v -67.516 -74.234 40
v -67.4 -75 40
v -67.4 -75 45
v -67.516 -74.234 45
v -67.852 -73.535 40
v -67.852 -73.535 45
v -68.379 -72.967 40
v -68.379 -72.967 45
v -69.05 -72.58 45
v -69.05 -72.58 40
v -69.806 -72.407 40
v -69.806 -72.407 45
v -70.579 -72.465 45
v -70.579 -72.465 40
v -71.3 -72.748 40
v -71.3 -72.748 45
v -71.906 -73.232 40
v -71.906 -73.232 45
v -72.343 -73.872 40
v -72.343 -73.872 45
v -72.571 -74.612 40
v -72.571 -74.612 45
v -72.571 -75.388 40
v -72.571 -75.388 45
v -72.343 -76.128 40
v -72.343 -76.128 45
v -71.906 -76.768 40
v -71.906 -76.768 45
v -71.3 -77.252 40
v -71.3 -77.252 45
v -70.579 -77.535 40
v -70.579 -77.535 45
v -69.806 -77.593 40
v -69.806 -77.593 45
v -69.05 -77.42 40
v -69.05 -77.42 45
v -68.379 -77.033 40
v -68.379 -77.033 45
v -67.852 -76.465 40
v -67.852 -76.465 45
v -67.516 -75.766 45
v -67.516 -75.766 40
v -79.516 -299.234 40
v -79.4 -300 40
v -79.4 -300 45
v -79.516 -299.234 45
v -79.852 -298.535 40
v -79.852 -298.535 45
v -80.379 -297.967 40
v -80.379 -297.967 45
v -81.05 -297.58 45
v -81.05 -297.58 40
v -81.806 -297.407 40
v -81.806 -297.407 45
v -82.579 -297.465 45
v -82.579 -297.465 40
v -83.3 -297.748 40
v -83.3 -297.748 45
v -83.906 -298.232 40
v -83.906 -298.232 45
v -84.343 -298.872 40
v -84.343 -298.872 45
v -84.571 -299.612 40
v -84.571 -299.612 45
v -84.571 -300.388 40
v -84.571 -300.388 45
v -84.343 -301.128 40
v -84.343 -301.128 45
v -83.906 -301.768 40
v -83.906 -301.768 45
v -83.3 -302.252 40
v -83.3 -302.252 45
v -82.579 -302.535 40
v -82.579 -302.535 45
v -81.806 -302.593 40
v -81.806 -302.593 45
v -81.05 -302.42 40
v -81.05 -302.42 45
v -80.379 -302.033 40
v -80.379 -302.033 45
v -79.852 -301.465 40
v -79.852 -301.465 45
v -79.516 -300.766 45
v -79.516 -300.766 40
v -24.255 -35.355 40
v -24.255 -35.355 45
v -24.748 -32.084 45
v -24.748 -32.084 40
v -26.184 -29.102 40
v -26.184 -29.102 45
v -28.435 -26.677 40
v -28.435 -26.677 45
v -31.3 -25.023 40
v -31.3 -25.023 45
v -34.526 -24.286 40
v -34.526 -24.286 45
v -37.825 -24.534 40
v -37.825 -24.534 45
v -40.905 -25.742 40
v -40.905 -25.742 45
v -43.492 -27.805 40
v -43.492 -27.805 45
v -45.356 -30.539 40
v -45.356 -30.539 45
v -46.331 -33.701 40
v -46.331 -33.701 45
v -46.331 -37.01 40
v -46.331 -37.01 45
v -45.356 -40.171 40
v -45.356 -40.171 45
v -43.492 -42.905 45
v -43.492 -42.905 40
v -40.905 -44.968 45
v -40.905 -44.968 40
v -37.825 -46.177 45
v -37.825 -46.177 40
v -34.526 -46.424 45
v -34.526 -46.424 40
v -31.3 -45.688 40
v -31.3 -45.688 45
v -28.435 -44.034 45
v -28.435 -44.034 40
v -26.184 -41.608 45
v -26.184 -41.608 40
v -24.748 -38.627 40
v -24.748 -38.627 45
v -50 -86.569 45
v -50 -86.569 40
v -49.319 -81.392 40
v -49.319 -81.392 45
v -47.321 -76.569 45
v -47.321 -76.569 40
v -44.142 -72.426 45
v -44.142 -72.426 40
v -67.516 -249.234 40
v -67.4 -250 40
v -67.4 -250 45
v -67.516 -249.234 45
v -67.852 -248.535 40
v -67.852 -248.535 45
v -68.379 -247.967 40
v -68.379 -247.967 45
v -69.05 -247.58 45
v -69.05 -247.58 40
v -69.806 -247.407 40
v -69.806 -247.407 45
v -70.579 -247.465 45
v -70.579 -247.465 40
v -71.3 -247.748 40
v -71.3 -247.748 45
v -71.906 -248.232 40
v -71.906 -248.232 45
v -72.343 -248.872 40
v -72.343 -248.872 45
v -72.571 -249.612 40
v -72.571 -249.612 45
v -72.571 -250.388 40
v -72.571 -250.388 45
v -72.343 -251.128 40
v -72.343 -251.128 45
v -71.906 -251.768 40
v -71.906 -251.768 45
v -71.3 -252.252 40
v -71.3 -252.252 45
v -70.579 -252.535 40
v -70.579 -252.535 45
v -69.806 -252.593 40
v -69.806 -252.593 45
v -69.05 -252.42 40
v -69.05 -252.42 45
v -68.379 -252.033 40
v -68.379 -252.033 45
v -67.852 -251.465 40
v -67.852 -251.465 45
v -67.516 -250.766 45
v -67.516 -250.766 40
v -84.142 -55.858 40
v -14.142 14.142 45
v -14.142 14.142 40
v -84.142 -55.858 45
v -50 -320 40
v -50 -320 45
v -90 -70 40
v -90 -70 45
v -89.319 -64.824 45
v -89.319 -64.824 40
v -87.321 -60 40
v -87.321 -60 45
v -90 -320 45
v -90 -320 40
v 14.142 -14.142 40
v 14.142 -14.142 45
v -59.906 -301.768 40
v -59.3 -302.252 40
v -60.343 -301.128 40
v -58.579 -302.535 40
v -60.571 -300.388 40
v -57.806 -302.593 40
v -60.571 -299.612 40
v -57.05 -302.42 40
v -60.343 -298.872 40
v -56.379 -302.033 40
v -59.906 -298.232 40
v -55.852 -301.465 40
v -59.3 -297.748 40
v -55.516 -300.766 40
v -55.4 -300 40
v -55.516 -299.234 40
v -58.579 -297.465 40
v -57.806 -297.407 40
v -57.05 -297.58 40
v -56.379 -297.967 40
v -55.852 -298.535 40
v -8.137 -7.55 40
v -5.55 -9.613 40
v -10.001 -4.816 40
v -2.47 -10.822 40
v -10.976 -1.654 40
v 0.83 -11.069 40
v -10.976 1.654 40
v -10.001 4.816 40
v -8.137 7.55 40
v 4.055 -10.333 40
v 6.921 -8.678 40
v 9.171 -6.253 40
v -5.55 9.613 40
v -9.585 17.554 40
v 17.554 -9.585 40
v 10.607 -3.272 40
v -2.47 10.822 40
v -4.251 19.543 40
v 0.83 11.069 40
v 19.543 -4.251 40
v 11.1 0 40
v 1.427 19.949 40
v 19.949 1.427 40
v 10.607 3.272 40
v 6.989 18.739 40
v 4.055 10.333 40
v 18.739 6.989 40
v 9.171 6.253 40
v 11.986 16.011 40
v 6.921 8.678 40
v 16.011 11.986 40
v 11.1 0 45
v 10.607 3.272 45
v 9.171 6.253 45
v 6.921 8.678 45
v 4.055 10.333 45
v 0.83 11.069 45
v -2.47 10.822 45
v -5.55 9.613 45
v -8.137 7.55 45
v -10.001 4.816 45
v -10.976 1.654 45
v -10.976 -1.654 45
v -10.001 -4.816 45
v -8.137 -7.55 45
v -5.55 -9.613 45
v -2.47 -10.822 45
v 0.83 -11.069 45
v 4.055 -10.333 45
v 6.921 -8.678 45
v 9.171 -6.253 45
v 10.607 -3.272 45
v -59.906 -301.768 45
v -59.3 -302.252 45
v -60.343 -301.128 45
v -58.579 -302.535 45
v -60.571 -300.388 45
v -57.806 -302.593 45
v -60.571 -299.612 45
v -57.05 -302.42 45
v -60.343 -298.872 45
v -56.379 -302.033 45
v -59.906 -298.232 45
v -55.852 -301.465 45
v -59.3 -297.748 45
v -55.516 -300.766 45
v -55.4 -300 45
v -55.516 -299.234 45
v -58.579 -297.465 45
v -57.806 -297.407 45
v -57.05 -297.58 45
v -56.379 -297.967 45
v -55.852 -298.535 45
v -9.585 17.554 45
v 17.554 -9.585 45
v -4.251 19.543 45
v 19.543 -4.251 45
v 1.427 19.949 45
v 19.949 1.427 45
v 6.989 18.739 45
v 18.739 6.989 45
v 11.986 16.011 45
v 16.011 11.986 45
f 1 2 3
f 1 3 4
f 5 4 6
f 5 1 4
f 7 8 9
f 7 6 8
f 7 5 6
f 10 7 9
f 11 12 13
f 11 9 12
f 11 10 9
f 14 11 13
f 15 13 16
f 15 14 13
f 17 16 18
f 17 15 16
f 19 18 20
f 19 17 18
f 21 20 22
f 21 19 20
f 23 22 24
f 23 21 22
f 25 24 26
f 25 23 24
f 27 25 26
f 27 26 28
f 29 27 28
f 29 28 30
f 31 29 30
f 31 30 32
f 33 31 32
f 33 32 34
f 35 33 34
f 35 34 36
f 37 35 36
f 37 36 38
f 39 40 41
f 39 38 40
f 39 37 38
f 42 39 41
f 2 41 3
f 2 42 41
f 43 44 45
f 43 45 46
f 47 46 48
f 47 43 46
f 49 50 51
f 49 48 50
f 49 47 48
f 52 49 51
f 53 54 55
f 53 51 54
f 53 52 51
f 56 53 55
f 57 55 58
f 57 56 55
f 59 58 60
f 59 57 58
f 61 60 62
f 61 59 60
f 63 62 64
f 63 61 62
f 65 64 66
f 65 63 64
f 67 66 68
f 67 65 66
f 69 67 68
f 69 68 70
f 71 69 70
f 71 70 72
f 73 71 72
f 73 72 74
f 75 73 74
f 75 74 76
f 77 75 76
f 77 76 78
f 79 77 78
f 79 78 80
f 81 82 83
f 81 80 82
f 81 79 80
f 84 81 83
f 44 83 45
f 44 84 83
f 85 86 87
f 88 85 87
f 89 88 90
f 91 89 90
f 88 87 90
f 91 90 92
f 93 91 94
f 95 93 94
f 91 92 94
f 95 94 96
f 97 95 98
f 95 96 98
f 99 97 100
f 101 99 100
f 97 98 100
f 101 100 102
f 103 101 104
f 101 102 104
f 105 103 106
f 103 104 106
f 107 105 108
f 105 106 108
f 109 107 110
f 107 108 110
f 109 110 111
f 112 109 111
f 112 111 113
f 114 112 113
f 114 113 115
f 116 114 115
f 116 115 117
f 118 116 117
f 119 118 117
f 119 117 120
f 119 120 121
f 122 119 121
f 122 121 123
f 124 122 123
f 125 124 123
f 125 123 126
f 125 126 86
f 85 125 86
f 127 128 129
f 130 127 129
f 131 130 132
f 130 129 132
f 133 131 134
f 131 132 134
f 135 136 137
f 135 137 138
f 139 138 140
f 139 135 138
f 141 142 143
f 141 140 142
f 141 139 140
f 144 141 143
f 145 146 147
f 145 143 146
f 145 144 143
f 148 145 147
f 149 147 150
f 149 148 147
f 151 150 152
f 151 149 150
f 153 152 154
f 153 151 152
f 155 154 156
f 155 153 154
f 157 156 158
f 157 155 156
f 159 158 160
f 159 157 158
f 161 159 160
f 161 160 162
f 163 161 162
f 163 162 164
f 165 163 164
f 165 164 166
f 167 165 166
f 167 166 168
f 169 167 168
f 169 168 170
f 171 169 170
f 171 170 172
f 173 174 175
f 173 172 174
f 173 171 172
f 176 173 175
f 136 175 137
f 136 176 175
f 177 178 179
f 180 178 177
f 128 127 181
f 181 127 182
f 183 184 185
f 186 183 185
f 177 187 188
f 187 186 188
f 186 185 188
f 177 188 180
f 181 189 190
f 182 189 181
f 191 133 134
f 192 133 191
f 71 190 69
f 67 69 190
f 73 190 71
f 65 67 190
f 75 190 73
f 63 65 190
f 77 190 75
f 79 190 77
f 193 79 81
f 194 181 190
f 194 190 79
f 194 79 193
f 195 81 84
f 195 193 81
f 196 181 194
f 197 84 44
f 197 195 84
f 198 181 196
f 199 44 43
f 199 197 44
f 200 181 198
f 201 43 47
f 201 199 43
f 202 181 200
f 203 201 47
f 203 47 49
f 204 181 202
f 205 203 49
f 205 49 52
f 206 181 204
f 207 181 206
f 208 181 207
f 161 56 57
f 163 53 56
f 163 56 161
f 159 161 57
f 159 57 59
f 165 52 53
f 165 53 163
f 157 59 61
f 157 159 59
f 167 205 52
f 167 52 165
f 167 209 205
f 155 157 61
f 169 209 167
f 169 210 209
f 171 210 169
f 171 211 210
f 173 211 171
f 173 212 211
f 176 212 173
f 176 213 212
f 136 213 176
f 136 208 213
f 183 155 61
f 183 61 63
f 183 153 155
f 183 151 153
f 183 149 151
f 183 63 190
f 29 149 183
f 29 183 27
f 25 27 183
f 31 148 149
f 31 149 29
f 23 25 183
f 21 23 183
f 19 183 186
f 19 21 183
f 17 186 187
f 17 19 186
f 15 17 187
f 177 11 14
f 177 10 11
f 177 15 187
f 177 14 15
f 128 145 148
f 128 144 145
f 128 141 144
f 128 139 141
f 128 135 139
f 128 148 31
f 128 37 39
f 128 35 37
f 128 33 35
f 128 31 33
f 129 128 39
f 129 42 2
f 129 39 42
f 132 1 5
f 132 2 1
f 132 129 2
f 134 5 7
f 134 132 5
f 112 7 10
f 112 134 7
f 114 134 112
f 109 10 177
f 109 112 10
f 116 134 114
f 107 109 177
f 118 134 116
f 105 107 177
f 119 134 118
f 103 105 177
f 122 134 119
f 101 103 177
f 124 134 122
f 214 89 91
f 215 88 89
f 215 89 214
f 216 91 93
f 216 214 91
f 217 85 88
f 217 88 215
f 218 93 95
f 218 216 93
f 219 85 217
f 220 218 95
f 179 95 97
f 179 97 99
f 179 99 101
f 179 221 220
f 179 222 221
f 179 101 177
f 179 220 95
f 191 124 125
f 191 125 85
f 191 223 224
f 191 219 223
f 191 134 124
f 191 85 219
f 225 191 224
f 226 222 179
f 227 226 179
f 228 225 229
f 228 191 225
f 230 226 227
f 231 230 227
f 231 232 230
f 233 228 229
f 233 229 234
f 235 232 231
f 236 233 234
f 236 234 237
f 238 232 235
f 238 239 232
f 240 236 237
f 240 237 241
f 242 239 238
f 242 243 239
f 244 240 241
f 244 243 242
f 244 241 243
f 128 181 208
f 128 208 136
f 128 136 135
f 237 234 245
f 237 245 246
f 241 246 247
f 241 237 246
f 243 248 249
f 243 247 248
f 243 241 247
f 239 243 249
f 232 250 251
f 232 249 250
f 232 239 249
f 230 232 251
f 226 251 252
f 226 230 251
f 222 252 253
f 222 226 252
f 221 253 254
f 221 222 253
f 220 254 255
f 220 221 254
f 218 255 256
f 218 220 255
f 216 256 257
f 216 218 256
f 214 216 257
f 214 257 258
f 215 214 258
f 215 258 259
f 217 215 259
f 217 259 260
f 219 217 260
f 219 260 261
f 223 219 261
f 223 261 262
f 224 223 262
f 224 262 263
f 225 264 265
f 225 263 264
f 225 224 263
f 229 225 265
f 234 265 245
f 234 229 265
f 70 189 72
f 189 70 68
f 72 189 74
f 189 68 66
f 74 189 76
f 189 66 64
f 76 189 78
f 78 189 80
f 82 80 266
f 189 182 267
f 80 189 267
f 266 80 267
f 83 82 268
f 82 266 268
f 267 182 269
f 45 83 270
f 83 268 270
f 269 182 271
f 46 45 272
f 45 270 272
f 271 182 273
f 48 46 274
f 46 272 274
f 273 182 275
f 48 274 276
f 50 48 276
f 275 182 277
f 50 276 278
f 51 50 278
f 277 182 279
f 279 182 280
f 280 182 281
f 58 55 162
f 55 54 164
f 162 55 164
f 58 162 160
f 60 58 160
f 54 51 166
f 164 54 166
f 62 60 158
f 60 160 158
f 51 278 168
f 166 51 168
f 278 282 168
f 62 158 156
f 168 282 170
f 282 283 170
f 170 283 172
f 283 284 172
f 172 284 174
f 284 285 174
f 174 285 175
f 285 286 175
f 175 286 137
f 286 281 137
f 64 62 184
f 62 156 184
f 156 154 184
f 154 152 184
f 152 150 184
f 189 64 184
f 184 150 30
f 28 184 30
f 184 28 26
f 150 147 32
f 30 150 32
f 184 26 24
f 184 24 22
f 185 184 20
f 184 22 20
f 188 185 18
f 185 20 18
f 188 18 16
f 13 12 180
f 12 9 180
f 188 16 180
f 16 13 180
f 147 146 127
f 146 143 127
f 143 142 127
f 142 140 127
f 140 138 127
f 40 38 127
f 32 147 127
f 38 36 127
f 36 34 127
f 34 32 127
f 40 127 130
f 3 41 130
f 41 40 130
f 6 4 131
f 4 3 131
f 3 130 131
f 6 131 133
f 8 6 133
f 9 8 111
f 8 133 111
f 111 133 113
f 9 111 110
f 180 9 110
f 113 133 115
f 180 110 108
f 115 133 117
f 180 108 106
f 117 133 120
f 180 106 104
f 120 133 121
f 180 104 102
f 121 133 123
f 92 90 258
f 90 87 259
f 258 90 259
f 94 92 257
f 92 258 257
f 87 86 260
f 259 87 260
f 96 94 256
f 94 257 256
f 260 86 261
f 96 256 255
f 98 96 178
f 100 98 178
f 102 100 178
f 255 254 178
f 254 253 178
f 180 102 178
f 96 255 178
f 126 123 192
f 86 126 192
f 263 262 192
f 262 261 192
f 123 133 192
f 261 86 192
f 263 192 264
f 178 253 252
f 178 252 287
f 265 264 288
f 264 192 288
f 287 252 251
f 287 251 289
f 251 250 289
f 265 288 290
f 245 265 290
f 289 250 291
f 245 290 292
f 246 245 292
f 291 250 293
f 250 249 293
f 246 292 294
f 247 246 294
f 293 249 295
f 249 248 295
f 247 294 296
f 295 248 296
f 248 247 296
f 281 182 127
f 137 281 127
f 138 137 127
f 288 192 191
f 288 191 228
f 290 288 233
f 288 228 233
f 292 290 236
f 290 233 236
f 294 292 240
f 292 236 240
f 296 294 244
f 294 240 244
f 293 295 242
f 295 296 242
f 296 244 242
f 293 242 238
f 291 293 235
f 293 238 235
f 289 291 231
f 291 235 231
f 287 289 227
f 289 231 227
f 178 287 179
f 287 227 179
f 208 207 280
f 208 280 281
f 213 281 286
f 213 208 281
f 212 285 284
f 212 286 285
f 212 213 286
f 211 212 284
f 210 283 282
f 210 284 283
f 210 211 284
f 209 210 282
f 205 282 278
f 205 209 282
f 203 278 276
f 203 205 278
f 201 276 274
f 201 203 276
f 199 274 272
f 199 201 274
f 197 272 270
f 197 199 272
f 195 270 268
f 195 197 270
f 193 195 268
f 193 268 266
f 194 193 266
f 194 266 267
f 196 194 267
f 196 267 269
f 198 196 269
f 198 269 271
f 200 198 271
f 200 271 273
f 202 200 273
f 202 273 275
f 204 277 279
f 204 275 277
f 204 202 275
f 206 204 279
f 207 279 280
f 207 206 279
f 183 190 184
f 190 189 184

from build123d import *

# Parameters (mm, degrees)
SKETCH_1_R                = 20
SKETCH_1_R_2              = 11.1
EXTRUDE_1_DEPTH           = 60
EXTRUDE_2_DEPTH           = 30
SKETCH_4_R                = 11
EXTRUDE_3_DEPTH           = 5
SKETCH_8_R                = 11.1
CUT_EXTRUDE_1_DEPTH       = 100
FILLET_4_R                = 20
EXTRUDE_START             = -30
SKETCH_18_R               = 35
EXTRUDE_4_DEPTH           = 5
EXTRUDE_START_2           = -25
SKETCH_19_R               = 35
EXTRUDE_5_DEPTH           = 5
FILLET_5_R                = 10
CUT_EXTRUDE_9_DEPTH       = 388.169213652
CUT_EXTRUDE_9_DEPTH_BACK  = 388.169213652
SKETCH_21_R               = 2.6
CUT_EXTRUDE_10_DEPTH      = 407.881000043
CUT_EXTRUDE_10_DEPTH_BACK = 407.881000043
SKETCH_22_W               = 45
SKETCH_22_H               = 451.378457943
SKETCH_22_W_2             = 20
SKETCH_22_H_2             = 431.087956996


with BuildPart() as part:
    # 草图1 → 凸台-拉伸1 (new body)
    with BuildSketch(Plane.XY):
        Circle(SKETCH_1_R)
        Circle(SKETCH_1_R_2, mode=Mode.SUBTRACT)
    extrude(amount=EXTRUDE_1_DEPTH)

    # 草图2 → 凸台-拉伸2 (add, symmetric)
    with BuildSketch(Plane.XY.offset(30)):
        with BuildLine():
            Line((-14.142135624, 14.142135624), (-90, -61.715728753))
            Line((-90, -61.715728753), (-90, -320))
            Line((-90, -320), (-50, -320))
            Line((-50, -320), (-50, -78.284271247))
            Line((-50, -78.284271247), (14.142135624, -14.142135624))
            ThreePointArc((14.142135624, -14.142135624), (-14.142135624, -14.142135624), (-14.142135624, 14.142135624))
        make_face()
    extrude(amount=EXTRUDE_2_DEPTH, both=True)

    # 草图4 → 凸台-拉伸3 (add)
    with BuildSketch(Plane.XY.offset(60)):
        with BuildLine():
            Line((-90, -290), (-50, -290))
            Line((-50, -290), (-50, -350))
            ThreePointArc((-50, -350), (-70, -370), (-90, -350))
            Line((-90, -350), (-90, -290))
        make_face()
        with Locations((-70, -350)):
            Circle(SKETCH_4_R, mode=Mode.SUBTRACT)
    extrude_3 = extrude(amount=EXTRUDE_3_DEPTH)

    # 镜向1: 凸台-拉伸3 across plane
    add(extrude_3.mirror(Plane.XY.offset(30)))

    # 草图8 → 切除-拉伸1 (cut)
    with BuildSketch(Plane.XY.offset(60)):
        with Locations((-35.355339059, -35.355339059)):
            Circle(SKETCH_8_R)
    extrude(amount=-CUT_EXTRUDE_1_DEPTH, mode=Mode.SUBTRACT)

    # 圆角4
    fillet_4_edges = [part.edges().sort_by_distance(p)[0] for p in [
        (-50, -78.284271247, 30),
        (-90, -61.715728753, 30),
    ]]
    fillet(fillet_4_edges, radius=FILLET_4_R)

    # 草图18 → 凸台-拉伸4 (add)
    with BuildSketch(Plane.XY.offset(60).offset(EXTRUDE_START)):
        with BuildLine():
            ThreePointArc((15.487252676, -12.654841151), (14.833346688, -13.415357842), (14.142135624, -14.142135624))
            Line((14.142135624, -14.142135624), (-44.142135624, -72.426406871))
            ThreePointArc((-44.142135624, -72.426406871), (-48.47759065, -78.914873848), (-50, -86.568542495))
            Line((-50, -86.568542495), (-50, -128.513280962))
            Line((-50, -128.513280962), (20.291868618, -128.513280962))
            ThreePointArc((20.291868618, -128.513280962), (62.790327113, -100.116718851), (52.818780552, -49.986369028))
            Line((52.818780552, -49.986369028), (15.487252676, -12.654841151))
        make_face()
        with Locations((20.291868618, -82.513280962)):
            Circle(SKETCH_18_R, mode=Mode.SUBTRACT)
    extrude(amount=EXTRUDE_4_DEPTH)

    # 草图19 → 凸台-拉伸5 (add)
    with BuildSketch(Plane(origin=(0, 0, 0), x_dir=(-1, 0, 0), z_dir=(0, 0, -1)).offset(EXTRUDE_START_2)):
        with BuildLine():
            Line((50, -134.571348531), (50, -226.571348531))
            Line((50, -226.571348531), (-0.680255104, -226.571348531))
            ThreePointArc((-0.680255104, -226.571348531), (-46.680255104, -180.571348531), (-0.680255104, -134.571348531))
            Line((-0.680255104, -134.571348531), (50, -134.571348531))
        make_face()
        with Locations((-0.680255104, -180.571348531)):
            Circle(SKETCH_19_R, mode=Mode.SUBTRACT)
    extrude(amount=-EXTRUDE_5_DEPTH)

    # 圆角5
    # the kernel refuses this fillet: 10 mm, written as the material it adds along each edge
    with BuildSketch(Plane(origin=(-50, -226.571348531, 25), x_dir=(0, -1, 0), z_dir=(0, 0, 1)), Plane(origin=(-50, -128.513280962, 30), x_dir=(0, -1, 0), z_dir=(0, 0, 1))) as fillet_5_piece_1:
        with BuildLine():
            CenterArc((FILLET_5_R, FILLET_5_R), FILLET_5_R, 180, 90)
            Line((0, FILLET_5_R), (0, 0))
            Line((0, 0), (FILLET_5_R, 0))
        make_face()
    extrude(amount=5)

    # 草图21 → 切除-拉伸9 (cut, two sides: drawn at the far end of the back side and taken through both)
    with BuildSketch(Plane.XY.offset(65).offset(-CUT_EXTRUDE_9_DEPTH_BACK)):
        with Locations((-70, -75)):
            Circle(SKETCH_21_R)
        with Locations((-70, -250)):
            Circle(SKETCH_21_R)
        with Locations((-58, -300)):
            Circle(SKETCH_21_R)
        with Locations((-82, -300)):
            Circle(SKETCH_21_R)
    extrude(amount=CUT_EXTRUDE_9_DEPTH + CUT_EXTRUDE_9_DEPTH_BACK, mode=Mode.SUBTRACT)

    # 草图22 → 切除-拉伸10 (cut, two sides: drawn at the far end of the back side and taken through both)
    with BuildSketch(Plane.ZY.offset(90).offset(-CUT_EXTRUDE_10_DEPTH_BACK)):
        with Locations((17.5, -160.771309387)):
            Rectangle(SKETCH_22_W, SKETCH_22_H)
        with Locations((55, -154.456021502)):
            Rectangle(SKETCH_22_W_2, SKETCH_22_H_2)
    extrude(amount=CUT_EXTRUDE_10_DEPTH + CUT_EXTRUDE_10_DEPTH_BACK, mode=Mode.SUBTRACT)


solid = part.part
